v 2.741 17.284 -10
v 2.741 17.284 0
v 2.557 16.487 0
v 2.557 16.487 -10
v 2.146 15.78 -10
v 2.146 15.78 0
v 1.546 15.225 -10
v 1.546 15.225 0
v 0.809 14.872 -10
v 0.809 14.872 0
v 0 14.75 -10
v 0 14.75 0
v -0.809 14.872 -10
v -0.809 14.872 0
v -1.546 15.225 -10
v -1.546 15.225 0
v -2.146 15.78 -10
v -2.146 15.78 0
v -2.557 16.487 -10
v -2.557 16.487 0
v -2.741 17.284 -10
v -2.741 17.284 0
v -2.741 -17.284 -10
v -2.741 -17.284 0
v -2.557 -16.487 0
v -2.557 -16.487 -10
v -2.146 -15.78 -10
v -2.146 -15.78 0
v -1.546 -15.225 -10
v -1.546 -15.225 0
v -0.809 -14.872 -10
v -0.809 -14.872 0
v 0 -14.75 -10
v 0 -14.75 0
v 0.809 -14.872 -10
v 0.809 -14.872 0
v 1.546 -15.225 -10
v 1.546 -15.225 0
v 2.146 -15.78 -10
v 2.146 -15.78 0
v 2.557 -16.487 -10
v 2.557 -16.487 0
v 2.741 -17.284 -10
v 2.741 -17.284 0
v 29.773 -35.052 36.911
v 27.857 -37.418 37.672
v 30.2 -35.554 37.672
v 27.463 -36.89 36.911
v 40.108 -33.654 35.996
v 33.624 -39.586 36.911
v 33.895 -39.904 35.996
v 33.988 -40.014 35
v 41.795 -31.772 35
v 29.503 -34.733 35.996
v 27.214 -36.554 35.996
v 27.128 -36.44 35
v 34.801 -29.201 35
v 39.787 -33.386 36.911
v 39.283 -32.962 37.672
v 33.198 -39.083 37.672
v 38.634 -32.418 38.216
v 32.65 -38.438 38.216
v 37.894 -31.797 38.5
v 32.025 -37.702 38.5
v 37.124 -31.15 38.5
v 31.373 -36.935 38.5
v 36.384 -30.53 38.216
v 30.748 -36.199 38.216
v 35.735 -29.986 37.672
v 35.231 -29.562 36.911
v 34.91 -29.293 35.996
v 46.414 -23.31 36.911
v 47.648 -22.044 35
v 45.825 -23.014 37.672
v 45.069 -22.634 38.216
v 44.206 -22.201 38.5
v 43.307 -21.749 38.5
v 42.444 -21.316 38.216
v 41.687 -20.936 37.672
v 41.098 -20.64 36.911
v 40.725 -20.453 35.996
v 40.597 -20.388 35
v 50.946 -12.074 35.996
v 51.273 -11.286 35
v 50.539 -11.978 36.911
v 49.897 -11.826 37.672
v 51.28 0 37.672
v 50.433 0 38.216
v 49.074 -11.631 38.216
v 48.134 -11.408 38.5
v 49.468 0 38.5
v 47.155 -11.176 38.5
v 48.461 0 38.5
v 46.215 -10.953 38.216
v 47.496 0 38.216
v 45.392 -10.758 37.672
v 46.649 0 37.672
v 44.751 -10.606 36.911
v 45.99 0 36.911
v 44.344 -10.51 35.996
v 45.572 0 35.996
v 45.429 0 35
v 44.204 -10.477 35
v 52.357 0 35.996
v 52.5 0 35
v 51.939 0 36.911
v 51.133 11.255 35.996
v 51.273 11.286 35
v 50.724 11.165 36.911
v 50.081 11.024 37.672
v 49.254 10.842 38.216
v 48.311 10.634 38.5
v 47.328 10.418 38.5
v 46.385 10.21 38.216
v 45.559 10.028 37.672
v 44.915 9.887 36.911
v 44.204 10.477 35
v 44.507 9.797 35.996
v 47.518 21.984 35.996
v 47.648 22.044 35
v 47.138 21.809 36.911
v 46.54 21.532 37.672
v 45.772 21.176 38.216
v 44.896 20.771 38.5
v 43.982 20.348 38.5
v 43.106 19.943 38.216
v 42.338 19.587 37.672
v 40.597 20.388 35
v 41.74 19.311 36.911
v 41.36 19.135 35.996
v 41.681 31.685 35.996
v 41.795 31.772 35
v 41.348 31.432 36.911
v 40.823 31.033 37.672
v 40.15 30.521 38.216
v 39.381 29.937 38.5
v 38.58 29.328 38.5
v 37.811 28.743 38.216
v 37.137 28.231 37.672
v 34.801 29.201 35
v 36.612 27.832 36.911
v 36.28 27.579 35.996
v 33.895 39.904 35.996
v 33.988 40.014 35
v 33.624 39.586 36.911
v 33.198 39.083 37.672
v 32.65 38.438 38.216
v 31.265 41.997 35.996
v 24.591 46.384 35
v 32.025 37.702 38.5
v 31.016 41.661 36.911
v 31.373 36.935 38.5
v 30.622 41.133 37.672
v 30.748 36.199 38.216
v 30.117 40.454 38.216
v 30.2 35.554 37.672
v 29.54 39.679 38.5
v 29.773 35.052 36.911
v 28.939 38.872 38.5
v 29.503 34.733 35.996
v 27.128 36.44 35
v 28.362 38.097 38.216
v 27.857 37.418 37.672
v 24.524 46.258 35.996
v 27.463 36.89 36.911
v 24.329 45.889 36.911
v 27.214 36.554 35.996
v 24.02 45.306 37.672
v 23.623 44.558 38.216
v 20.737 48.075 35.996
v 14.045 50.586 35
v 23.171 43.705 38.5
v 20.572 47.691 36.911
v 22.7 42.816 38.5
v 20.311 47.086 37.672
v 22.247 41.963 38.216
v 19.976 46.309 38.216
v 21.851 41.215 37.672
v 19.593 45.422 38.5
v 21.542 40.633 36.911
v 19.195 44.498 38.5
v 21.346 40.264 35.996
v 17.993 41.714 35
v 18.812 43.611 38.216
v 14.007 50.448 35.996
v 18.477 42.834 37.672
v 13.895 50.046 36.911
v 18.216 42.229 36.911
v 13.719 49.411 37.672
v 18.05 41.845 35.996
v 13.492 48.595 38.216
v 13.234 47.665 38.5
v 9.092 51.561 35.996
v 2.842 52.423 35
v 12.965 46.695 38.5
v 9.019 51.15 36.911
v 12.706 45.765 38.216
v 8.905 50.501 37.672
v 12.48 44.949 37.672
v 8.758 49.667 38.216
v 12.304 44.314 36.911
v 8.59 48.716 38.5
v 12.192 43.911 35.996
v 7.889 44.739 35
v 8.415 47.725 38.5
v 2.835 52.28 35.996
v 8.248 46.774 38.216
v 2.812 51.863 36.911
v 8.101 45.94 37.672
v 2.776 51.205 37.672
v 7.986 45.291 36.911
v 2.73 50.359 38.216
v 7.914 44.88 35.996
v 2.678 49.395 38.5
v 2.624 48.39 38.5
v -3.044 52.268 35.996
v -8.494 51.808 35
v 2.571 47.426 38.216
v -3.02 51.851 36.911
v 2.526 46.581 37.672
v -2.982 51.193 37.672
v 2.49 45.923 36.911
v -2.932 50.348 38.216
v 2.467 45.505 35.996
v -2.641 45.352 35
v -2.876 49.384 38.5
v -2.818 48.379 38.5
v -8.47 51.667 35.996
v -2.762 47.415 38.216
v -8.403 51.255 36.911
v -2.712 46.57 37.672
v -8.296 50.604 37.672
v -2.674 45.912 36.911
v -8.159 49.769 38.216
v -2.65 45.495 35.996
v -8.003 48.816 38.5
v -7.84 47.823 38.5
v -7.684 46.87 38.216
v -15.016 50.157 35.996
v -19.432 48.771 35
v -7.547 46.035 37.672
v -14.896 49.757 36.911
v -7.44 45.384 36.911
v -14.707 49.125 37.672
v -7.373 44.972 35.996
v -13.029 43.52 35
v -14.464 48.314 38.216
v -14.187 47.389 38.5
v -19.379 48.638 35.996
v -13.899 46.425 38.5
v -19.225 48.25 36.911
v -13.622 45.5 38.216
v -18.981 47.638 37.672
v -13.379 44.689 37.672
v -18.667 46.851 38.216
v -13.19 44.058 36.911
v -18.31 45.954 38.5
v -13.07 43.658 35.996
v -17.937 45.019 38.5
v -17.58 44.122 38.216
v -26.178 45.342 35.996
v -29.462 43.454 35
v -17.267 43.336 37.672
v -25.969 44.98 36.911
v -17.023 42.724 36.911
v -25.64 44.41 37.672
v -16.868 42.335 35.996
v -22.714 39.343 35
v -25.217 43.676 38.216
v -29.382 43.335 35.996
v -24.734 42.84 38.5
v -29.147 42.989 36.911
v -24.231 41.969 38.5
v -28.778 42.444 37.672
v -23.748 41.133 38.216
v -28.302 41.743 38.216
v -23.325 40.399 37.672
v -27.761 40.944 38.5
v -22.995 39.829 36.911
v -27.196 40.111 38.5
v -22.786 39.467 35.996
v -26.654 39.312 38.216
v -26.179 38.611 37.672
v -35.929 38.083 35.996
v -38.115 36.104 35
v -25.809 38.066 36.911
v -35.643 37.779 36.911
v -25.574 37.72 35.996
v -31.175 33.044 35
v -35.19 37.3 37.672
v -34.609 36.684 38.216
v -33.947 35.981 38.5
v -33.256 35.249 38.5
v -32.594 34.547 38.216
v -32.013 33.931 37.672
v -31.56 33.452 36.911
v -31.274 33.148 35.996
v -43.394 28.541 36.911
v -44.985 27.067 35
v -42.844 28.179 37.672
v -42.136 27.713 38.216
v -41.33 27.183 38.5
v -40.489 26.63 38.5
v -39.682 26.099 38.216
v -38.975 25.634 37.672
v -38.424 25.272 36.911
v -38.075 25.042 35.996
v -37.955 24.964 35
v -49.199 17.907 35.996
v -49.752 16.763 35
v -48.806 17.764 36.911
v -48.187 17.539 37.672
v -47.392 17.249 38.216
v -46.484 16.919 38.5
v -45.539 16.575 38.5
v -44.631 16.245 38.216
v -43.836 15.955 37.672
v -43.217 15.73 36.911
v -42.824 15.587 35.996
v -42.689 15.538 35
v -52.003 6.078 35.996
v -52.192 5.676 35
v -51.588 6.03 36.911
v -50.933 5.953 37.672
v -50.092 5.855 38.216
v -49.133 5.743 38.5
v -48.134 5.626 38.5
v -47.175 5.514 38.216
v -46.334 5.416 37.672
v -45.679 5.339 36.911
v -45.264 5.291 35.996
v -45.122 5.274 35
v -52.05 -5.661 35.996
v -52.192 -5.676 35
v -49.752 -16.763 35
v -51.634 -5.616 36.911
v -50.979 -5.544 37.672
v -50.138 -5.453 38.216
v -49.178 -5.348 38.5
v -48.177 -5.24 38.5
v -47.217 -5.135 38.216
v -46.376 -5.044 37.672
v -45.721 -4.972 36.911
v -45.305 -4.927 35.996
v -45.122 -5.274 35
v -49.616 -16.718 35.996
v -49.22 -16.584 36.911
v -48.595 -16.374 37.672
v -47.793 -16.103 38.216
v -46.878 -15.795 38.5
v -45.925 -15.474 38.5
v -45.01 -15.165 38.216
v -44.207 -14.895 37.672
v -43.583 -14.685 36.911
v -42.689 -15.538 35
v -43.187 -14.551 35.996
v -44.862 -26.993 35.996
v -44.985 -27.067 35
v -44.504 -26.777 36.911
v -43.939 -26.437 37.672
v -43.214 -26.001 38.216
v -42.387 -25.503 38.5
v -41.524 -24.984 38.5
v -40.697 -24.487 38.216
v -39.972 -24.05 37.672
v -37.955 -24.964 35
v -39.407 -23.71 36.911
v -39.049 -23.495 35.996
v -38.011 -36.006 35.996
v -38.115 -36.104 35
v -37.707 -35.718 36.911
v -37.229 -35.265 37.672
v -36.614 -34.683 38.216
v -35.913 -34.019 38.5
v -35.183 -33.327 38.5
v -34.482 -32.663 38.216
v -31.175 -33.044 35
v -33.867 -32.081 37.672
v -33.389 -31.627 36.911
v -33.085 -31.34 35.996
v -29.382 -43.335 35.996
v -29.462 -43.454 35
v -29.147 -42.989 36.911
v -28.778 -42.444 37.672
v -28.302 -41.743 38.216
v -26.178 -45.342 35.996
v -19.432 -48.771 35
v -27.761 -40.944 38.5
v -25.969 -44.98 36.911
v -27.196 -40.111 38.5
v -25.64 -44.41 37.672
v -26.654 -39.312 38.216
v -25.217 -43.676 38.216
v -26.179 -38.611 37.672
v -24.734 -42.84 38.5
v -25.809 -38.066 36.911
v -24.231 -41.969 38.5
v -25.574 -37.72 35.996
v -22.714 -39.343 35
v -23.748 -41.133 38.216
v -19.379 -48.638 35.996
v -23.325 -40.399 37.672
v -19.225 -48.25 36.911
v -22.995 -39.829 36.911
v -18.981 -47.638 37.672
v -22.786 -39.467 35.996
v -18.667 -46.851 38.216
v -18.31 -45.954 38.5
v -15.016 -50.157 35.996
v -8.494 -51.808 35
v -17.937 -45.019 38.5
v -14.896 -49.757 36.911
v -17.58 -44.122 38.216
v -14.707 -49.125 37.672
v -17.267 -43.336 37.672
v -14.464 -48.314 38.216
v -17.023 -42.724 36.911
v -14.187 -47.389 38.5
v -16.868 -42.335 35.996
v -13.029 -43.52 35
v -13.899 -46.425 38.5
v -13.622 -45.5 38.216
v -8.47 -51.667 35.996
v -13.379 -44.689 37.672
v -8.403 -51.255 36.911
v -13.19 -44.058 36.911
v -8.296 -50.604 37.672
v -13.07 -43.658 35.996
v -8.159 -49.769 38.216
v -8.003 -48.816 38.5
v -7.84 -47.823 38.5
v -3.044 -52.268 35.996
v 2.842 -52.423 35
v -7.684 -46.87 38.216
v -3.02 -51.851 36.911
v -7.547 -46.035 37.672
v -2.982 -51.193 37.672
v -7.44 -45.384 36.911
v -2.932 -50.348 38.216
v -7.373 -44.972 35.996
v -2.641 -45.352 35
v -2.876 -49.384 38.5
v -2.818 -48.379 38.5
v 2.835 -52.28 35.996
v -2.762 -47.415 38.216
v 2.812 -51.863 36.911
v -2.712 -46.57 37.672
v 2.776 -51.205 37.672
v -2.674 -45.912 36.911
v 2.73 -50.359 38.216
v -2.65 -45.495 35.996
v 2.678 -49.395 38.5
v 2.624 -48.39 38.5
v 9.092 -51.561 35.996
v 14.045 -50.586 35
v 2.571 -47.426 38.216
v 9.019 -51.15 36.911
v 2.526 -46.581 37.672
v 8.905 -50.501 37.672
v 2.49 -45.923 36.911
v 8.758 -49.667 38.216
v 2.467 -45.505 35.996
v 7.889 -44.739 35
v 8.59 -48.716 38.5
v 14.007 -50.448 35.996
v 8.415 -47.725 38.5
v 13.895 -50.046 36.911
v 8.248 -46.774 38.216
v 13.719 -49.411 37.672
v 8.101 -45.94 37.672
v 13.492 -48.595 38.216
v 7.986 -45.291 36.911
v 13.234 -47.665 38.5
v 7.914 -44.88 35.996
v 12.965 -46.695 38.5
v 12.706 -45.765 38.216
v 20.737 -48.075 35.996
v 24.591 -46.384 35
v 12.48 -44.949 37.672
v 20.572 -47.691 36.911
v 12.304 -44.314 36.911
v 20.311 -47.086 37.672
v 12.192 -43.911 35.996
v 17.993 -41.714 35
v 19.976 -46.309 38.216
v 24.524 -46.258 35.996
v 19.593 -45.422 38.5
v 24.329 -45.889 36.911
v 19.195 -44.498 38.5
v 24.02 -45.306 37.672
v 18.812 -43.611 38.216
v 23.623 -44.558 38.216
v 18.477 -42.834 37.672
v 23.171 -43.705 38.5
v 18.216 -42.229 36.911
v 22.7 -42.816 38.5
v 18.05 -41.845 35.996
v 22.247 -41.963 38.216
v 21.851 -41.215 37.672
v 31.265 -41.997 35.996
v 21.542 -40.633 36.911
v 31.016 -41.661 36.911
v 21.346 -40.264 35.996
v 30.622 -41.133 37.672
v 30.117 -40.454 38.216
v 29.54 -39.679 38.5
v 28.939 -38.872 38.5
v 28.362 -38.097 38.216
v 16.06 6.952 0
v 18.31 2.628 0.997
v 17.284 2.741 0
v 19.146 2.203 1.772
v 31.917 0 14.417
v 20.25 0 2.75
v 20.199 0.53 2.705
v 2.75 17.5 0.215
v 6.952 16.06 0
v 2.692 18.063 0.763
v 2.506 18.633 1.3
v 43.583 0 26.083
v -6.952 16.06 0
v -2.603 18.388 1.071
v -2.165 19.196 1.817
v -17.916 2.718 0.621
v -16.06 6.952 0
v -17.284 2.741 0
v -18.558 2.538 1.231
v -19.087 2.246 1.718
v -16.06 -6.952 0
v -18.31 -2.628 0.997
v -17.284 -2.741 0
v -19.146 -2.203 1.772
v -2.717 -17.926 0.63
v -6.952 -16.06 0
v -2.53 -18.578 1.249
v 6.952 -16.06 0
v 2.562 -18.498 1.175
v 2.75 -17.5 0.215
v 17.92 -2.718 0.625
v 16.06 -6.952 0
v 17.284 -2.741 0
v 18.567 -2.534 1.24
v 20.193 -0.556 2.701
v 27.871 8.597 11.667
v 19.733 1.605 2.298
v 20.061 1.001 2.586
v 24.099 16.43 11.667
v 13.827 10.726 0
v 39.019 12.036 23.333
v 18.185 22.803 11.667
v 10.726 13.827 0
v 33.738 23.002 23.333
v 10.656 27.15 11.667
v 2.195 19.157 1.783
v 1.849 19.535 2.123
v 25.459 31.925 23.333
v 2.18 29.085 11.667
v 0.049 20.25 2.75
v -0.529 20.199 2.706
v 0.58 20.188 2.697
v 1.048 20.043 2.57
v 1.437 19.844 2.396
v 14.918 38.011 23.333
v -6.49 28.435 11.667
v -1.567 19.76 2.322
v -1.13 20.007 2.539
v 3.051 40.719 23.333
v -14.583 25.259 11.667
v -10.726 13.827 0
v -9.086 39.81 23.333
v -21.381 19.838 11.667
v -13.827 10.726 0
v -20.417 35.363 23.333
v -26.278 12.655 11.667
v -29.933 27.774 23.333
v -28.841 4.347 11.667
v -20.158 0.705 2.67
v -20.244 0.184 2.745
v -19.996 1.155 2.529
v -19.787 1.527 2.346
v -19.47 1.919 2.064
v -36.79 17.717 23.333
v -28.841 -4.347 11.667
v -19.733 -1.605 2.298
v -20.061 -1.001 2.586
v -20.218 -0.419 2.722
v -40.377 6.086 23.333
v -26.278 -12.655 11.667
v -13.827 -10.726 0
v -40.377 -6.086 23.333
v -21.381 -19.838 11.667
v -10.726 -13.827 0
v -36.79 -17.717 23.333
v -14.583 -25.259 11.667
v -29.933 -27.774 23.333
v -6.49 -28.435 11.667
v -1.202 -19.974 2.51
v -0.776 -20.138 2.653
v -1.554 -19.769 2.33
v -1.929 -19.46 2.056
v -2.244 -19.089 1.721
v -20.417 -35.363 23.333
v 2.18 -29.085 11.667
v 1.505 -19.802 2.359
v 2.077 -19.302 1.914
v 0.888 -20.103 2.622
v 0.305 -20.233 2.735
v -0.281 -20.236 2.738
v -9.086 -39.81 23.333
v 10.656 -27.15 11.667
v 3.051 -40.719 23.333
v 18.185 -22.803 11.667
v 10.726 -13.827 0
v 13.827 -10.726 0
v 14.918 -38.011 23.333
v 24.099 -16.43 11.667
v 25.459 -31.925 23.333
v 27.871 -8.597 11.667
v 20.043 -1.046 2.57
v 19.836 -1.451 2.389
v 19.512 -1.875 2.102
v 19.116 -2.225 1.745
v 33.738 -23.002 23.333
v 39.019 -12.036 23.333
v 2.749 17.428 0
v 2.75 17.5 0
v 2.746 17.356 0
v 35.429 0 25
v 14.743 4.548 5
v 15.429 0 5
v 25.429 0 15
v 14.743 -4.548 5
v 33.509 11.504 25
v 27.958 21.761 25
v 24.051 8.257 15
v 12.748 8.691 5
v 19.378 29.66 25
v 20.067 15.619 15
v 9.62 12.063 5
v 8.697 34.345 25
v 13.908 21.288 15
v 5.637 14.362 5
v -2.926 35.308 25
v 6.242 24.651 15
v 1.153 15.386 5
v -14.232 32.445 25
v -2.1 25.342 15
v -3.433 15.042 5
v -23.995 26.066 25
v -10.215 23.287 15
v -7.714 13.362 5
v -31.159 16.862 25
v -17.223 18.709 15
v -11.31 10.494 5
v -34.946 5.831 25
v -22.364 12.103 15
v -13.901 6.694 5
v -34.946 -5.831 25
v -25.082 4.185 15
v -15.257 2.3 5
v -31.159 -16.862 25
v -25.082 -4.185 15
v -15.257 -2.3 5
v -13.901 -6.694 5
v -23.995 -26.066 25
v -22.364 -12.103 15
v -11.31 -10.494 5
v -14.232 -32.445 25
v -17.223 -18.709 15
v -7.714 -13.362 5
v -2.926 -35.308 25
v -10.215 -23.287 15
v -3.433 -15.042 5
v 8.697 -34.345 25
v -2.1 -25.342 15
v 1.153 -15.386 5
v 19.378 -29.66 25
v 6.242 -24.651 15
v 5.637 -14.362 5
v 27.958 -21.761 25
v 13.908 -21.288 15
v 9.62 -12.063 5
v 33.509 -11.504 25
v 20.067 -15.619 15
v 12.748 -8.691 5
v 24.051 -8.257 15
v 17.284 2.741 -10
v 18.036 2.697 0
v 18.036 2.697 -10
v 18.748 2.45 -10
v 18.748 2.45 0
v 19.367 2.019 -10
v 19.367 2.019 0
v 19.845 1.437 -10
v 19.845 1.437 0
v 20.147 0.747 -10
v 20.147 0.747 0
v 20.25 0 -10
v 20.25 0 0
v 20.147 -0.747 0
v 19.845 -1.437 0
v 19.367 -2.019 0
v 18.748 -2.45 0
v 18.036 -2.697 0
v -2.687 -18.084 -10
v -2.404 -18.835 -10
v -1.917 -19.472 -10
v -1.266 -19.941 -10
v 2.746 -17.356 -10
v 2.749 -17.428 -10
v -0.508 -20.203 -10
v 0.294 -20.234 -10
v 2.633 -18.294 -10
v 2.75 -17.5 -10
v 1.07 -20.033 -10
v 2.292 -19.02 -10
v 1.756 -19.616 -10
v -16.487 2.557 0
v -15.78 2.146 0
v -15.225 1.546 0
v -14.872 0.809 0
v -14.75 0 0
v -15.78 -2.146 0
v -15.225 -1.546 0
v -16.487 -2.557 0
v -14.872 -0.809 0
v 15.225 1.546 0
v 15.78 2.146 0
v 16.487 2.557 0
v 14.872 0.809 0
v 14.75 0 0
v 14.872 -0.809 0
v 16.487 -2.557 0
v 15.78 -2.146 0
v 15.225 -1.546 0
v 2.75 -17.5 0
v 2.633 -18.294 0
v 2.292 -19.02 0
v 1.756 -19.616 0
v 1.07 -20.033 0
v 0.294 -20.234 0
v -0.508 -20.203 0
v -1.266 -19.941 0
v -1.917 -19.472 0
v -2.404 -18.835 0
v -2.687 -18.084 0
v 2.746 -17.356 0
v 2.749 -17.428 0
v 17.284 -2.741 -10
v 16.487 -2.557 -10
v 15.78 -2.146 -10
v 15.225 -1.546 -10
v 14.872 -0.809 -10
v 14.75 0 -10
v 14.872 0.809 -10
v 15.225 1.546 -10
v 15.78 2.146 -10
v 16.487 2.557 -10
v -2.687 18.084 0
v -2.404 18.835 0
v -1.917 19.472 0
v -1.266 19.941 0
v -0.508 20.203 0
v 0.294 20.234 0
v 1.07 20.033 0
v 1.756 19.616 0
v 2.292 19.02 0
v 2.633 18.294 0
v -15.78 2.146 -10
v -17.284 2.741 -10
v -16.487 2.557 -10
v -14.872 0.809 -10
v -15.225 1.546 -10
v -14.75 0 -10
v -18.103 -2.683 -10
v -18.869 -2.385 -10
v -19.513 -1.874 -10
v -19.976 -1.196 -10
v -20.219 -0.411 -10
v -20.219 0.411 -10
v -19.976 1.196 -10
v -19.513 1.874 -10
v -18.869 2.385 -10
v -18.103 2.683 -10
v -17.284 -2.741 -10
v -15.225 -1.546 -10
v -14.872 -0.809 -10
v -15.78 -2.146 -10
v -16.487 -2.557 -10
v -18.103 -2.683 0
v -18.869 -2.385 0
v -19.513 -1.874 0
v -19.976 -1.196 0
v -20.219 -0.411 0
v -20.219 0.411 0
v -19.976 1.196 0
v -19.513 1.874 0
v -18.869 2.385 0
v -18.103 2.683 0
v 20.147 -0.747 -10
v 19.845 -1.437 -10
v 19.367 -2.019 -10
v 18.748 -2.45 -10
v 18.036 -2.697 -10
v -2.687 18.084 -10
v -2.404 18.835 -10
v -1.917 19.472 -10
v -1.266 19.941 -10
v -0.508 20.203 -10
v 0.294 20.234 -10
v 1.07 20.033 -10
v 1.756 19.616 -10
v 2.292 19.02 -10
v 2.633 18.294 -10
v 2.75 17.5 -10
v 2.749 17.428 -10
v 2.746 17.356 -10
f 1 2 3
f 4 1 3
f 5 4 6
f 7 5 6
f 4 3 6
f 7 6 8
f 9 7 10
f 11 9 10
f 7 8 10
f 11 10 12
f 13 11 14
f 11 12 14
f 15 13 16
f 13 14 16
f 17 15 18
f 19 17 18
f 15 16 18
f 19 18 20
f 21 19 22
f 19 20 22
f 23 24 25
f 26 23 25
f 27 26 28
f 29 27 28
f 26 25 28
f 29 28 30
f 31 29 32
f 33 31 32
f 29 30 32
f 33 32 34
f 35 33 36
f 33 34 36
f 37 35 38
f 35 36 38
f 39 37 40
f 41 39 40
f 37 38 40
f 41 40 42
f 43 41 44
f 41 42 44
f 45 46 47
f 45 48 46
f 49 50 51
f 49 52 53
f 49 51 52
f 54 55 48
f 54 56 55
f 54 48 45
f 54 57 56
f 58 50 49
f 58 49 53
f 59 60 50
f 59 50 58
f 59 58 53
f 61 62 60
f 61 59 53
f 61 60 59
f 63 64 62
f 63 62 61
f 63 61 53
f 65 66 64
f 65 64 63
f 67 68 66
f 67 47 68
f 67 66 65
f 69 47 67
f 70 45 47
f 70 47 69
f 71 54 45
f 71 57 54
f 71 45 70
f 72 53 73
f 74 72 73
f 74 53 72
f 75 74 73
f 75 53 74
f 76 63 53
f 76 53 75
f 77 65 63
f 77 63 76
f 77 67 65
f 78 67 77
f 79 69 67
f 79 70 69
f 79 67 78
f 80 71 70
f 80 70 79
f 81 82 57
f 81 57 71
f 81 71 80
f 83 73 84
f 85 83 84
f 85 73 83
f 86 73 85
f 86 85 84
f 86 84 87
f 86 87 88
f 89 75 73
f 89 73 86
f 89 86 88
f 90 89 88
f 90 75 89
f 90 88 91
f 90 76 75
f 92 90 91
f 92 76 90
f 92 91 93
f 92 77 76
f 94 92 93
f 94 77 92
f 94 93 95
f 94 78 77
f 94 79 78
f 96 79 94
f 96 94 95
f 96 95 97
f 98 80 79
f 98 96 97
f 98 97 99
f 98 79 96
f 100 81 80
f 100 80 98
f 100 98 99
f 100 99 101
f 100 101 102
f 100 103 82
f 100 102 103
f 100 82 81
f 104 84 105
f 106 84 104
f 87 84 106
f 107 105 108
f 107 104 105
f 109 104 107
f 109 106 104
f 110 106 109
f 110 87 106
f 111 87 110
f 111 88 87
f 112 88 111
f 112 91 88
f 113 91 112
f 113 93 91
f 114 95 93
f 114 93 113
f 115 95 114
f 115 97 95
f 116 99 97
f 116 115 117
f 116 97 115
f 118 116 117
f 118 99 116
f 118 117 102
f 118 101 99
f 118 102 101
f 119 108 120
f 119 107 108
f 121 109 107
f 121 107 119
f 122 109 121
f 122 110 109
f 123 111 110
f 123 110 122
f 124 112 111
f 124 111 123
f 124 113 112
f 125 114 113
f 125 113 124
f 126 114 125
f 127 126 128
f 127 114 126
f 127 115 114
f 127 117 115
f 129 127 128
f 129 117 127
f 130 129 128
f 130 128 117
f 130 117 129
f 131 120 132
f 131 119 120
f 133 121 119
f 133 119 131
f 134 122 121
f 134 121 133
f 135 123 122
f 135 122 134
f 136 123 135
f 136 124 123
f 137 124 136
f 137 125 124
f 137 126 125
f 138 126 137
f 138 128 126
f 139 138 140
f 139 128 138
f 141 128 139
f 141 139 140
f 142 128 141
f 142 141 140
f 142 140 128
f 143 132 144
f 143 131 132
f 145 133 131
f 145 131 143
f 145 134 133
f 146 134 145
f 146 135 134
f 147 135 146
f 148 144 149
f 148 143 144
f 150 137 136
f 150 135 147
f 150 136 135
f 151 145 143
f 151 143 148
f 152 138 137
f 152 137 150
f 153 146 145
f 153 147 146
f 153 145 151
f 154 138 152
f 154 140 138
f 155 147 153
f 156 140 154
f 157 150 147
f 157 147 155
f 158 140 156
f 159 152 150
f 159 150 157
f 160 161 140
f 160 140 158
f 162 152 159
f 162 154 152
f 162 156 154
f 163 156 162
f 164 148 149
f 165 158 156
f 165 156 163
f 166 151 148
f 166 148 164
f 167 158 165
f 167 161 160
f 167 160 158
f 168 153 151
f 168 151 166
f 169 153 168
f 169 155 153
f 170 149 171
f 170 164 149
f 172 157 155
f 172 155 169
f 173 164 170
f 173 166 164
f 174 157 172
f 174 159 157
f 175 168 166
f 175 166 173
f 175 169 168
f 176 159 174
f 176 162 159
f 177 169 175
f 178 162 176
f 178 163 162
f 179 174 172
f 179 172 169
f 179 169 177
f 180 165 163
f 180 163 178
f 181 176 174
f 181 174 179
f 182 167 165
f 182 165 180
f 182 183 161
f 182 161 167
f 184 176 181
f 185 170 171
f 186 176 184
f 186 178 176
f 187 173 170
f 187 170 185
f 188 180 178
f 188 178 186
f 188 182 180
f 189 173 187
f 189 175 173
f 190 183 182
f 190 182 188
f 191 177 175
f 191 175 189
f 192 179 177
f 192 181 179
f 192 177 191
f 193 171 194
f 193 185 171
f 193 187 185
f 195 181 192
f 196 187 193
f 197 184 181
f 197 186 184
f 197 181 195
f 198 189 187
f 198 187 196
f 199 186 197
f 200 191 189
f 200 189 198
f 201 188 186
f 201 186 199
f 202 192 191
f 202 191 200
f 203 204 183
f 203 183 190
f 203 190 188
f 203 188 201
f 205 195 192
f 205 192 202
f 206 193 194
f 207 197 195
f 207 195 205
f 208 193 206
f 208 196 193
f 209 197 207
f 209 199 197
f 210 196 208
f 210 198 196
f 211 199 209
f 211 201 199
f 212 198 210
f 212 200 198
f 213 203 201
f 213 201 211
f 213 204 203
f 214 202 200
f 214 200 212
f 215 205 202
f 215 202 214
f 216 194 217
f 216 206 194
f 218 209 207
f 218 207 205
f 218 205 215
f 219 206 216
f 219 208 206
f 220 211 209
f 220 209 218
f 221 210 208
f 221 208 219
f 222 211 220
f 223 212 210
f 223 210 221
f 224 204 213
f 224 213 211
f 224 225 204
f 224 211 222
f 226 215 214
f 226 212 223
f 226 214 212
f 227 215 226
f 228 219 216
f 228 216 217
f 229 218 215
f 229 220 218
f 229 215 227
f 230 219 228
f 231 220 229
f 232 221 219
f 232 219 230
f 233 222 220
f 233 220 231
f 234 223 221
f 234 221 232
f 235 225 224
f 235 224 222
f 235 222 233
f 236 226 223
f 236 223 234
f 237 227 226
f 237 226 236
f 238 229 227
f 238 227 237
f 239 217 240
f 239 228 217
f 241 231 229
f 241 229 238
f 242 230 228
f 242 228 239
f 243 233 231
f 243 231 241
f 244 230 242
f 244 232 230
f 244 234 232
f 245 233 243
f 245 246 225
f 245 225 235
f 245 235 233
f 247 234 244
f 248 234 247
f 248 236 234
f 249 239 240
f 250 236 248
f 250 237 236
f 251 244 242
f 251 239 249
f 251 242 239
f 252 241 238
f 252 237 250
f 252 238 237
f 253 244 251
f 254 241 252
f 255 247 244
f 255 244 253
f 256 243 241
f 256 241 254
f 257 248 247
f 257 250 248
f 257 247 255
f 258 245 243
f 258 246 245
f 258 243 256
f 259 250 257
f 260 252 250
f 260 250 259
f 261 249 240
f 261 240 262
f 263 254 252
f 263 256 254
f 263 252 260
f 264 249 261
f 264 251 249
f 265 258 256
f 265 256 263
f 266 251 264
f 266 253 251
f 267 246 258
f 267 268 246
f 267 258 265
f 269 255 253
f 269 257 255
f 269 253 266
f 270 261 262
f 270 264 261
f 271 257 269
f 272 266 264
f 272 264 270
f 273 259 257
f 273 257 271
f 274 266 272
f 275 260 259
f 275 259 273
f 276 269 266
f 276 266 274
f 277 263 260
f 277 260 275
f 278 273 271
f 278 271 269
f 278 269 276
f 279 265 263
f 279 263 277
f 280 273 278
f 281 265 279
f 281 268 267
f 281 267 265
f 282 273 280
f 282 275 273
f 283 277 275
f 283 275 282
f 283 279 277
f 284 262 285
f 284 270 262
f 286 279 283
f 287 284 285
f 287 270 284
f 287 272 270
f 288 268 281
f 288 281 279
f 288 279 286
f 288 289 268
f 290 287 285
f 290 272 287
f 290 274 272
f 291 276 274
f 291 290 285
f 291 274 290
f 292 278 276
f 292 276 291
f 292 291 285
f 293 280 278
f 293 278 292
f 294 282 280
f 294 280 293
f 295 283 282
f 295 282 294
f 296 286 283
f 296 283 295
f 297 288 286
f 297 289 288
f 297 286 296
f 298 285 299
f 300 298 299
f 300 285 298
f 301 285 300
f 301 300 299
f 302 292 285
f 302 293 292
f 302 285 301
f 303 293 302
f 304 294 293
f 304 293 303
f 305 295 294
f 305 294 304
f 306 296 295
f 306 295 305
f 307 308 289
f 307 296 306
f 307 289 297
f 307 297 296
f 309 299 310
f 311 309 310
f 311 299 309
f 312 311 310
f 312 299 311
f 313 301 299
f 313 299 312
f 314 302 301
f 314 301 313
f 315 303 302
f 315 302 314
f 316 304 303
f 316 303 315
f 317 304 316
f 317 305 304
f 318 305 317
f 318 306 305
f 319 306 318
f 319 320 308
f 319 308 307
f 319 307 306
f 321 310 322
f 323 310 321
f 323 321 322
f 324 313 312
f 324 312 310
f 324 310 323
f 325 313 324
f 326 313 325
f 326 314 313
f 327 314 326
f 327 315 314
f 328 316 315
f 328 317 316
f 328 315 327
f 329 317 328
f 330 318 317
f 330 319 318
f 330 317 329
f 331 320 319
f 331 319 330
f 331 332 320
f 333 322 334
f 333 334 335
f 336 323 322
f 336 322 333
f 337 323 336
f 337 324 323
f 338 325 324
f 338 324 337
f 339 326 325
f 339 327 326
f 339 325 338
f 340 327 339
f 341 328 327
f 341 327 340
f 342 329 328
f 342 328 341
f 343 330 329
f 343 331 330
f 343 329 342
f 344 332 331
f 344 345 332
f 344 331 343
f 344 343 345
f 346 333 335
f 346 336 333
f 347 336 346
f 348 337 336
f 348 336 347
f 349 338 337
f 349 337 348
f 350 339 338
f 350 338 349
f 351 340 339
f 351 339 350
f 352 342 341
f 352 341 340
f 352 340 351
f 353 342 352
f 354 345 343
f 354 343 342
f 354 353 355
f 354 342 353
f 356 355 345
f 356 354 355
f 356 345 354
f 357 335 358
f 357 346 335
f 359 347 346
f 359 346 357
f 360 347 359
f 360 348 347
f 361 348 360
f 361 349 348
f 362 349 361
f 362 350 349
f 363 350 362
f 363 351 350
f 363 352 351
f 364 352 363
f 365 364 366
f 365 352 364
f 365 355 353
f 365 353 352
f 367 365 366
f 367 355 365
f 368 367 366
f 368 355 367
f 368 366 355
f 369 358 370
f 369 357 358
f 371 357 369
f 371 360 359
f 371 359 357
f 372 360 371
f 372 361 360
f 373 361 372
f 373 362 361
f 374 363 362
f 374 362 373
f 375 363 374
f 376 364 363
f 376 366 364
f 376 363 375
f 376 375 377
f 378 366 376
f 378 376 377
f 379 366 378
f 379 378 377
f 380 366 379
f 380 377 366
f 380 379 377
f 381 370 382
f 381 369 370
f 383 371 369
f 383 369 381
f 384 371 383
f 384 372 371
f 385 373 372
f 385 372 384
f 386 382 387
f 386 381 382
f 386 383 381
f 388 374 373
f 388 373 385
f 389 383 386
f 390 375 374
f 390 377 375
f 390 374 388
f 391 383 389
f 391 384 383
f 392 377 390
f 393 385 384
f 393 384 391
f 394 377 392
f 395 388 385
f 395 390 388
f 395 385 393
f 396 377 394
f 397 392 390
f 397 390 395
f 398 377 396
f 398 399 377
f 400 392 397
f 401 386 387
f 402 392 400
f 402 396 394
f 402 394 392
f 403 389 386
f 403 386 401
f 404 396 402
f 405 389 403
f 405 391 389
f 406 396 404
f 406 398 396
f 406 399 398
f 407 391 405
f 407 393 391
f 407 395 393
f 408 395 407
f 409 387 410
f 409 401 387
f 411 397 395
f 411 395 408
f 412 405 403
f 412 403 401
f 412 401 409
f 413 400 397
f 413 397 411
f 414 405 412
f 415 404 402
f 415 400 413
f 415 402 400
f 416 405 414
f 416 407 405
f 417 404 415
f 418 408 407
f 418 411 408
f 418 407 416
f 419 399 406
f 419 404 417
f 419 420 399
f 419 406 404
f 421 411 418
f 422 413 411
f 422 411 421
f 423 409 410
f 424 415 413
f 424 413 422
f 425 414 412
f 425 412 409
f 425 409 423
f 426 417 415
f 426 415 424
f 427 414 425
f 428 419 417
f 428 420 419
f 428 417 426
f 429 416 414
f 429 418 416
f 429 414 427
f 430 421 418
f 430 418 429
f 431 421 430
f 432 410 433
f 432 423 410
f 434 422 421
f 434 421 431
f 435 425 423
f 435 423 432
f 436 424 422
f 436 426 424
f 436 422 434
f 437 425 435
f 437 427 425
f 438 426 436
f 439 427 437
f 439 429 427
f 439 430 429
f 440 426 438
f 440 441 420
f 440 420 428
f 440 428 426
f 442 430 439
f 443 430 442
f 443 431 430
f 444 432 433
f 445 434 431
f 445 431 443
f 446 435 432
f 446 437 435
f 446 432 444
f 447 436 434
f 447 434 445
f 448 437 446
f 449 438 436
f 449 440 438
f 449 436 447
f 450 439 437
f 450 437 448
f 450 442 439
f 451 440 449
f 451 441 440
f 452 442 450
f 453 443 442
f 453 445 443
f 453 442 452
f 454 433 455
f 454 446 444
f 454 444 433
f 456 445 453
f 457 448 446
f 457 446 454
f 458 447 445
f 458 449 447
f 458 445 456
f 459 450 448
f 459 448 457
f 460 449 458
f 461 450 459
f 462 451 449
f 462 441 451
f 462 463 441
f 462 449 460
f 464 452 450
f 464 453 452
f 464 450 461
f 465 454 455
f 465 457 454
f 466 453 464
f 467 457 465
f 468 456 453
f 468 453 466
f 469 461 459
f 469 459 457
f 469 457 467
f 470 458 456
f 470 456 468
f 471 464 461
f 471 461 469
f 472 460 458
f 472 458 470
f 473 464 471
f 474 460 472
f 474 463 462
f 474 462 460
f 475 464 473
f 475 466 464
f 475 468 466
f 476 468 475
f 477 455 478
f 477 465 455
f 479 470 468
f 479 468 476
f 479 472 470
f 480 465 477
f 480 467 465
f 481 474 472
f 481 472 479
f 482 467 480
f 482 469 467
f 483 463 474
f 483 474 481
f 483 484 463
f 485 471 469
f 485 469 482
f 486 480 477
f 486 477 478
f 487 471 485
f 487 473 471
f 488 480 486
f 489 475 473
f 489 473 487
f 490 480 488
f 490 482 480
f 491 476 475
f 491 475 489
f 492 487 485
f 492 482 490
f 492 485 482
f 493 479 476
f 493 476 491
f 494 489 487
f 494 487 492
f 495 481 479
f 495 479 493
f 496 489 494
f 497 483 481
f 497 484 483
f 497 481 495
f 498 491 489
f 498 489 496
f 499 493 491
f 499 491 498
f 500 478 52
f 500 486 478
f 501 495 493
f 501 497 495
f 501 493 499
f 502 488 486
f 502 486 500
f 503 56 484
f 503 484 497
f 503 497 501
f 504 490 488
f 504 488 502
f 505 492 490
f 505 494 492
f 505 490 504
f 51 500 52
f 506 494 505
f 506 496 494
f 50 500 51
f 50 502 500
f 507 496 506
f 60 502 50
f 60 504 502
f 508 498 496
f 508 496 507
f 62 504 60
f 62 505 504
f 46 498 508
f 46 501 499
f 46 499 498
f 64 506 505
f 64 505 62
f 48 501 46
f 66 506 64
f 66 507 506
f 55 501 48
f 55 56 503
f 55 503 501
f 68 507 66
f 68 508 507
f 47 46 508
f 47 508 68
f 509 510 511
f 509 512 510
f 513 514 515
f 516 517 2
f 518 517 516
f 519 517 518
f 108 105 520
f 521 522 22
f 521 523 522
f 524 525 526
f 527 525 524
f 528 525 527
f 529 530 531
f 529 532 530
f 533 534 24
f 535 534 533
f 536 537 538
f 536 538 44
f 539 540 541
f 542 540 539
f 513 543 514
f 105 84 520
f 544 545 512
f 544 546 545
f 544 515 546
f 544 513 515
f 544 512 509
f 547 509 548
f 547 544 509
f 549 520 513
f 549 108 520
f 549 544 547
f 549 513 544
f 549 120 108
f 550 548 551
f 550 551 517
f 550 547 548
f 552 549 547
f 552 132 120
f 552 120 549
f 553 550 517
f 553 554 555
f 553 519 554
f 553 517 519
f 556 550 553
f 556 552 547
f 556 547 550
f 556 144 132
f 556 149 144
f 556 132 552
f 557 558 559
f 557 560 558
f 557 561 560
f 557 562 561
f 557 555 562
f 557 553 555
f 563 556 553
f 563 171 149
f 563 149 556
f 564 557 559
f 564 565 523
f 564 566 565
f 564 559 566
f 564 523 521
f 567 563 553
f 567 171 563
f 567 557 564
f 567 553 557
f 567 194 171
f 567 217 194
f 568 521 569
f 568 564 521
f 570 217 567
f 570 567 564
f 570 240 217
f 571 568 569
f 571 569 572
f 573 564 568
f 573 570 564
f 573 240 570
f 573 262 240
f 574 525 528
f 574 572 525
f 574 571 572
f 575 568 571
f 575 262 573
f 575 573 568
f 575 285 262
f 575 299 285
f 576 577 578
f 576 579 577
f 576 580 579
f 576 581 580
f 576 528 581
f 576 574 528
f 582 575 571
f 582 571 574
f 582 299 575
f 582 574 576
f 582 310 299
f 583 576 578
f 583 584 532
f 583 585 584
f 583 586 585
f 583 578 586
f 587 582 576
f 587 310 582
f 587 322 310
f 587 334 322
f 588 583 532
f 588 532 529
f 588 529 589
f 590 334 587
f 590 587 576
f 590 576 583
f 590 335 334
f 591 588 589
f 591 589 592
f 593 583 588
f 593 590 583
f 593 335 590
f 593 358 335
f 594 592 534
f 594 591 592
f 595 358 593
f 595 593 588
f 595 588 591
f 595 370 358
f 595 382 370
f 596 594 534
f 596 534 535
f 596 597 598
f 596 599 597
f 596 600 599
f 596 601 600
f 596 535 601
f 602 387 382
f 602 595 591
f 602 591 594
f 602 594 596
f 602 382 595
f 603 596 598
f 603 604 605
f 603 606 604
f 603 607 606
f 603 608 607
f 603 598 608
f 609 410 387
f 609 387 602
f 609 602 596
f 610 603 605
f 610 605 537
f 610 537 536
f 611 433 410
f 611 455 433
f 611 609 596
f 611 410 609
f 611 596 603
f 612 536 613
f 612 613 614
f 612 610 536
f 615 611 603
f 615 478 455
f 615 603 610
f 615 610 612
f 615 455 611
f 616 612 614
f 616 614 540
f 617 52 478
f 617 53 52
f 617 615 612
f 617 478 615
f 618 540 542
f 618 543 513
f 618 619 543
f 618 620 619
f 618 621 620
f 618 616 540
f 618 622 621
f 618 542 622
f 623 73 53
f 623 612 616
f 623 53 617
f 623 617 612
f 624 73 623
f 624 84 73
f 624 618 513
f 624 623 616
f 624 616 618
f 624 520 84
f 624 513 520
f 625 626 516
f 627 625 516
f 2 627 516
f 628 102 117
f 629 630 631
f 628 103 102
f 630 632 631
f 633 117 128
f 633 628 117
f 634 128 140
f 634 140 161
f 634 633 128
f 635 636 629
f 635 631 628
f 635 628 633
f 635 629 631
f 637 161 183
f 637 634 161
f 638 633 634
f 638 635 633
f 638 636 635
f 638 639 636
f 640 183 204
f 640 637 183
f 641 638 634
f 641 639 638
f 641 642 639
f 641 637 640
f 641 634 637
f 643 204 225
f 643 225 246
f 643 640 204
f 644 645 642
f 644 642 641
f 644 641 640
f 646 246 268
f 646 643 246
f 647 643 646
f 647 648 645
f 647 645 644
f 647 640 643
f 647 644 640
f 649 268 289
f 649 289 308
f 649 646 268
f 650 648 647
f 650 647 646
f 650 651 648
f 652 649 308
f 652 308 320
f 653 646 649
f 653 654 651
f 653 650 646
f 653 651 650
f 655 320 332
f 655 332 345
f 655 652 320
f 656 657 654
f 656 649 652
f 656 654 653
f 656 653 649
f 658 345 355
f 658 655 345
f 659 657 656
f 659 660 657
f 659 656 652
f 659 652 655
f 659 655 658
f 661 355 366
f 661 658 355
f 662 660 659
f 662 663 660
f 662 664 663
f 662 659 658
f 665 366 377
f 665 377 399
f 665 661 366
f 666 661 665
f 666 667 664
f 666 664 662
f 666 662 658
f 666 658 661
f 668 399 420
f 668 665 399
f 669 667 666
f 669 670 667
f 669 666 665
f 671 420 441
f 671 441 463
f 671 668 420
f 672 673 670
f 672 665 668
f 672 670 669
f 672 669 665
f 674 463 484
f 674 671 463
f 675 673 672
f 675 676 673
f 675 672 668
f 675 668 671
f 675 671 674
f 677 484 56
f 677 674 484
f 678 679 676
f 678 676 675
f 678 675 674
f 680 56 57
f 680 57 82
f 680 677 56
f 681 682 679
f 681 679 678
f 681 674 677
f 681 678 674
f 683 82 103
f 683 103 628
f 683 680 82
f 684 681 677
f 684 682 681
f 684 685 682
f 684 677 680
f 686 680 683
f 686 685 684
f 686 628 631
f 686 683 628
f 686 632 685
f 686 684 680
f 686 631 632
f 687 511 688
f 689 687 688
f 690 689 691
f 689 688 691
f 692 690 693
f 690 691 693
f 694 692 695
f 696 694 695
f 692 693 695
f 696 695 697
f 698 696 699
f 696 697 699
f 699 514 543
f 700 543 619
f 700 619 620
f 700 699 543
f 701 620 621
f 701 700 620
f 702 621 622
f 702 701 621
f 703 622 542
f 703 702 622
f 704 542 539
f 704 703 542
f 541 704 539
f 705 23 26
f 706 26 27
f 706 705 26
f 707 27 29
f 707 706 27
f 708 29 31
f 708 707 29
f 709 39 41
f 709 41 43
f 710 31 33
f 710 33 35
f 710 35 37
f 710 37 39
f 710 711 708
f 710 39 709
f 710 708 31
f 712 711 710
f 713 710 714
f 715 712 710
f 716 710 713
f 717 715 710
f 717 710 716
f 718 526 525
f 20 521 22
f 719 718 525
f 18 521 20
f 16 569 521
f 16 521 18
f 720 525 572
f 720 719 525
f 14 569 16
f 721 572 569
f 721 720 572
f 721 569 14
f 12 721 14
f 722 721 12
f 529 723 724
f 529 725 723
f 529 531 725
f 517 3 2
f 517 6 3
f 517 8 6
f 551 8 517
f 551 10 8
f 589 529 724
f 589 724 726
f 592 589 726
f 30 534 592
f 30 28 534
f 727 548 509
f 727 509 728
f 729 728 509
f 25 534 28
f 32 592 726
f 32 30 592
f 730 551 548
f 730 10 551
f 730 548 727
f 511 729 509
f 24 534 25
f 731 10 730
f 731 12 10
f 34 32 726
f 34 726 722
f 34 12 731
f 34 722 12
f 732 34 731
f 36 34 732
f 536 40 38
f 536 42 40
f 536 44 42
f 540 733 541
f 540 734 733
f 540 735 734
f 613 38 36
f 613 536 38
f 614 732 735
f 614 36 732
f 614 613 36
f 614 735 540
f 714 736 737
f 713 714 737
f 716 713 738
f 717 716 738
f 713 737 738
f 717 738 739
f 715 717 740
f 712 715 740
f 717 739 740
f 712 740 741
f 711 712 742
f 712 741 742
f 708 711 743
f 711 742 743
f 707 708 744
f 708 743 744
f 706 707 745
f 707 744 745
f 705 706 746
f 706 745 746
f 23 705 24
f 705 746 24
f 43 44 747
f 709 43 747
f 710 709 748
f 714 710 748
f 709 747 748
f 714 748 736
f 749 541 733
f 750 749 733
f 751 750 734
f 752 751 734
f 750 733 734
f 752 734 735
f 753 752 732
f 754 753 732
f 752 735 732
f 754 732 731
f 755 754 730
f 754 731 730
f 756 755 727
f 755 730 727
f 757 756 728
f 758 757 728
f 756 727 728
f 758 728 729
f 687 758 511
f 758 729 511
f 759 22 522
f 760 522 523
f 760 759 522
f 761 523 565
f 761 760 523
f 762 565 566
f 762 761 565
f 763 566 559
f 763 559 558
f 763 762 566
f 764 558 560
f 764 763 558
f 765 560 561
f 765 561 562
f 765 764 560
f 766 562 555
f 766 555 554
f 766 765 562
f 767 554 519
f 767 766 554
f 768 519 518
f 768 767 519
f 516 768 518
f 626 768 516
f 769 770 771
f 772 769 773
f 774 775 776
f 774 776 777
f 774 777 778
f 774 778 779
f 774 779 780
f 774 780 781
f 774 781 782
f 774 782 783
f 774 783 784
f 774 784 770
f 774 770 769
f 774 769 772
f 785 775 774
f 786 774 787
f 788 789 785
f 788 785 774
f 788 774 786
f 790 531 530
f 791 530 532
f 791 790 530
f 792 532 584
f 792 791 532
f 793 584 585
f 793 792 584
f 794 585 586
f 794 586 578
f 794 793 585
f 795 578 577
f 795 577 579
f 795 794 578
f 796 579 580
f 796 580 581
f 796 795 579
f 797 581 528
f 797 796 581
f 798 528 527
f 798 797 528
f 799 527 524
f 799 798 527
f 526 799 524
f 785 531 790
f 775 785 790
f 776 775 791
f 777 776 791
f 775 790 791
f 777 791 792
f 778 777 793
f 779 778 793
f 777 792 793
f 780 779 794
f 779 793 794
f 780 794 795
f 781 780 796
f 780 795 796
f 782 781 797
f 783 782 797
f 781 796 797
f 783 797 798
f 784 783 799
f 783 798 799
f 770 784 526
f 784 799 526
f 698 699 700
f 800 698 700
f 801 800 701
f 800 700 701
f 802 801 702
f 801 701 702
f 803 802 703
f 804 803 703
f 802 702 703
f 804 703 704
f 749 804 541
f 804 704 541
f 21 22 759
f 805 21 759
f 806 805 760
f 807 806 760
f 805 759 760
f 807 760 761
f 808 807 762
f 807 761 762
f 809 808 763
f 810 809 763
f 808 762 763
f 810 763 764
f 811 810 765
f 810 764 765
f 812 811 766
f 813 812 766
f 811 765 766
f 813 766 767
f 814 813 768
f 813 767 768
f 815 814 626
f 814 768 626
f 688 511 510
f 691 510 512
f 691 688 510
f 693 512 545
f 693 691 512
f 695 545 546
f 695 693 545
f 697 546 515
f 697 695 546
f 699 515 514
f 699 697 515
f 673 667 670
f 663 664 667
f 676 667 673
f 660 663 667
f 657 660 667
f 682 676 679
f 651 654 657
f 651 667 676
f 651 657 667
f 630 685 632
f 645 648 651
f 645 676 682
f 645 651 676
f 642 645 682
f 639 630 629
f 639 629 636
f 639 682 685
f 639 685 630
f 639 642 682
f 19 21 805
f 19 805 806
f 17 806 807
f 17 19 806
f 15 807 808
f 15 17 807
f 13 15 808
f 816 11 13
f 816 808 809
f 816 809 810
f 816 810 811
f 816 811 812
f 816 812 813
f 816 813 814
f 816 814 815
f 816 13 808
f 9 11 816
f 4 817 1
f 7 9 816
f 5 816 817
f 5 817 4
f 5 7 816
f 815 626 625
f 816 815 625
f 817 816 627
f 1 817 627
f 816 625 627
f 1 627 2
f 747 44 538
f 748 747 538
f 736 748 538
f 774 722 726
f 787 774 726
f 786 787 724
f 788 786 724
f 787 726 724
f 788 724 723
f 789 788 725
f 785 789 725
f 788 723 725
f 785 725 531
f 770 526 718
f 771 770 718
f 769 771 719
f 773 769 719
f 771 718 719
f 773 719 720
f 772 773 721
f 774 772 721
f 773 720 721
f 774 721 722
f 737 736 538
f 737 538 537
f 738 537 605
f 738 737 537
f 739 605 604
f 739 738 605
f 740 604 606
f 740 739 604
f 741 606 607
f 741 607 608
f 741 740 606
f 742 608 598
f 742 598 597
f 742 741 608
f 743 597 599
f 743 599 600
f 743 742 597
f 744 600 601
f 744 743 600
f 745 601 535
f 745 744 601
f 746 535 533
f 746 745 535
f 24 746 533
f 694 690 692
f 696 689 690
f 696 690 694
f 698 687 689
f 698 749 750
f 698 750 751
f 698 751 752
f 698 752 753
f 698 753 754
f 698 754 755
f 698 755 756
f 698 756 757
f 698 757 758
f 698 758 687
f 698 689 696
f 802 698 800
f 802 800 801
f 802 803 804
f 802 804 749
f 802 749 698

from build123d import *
from build123d import SkipClean  # not in build123d's __all__

# Parameters (mm, degrees)
F4_DEPTH = 10


with BuildPart() as f1:
    # F0 (on Front) → F1 (revolve)
    with BuildSketch(Plane.XZ):
        with BuildLine():
            Line((0, 5), (0, 0))
            Line((0, 0), (17.5, 0))
            Line((17.5, 0), (48.9644660941, 31.4644660941))
            ThreePointArc((48.9644660941, 31.4644660941), (46.4644660941, 32.5), (45.4289321881, 35))
            Line((45.4289321881, 35), (15.4289321881, 5))
            Line((15.4289321881, 5), (0, 5))
        make_face()
        with BuildLine():
            Line((45.4289321881, 35), (52.5, 35))
            ThreePointArc((52.5, 35), (48.9644660941, 38.5355339059), (45.4289321881, 35))
        make_face()
        with BuildLine():
            ThreePointArc((45.4289321881, 35), (46.4644660941, 32.5), (48.9644660941, 31.4644660941))
            Line((48.9644660941, 31.4644660941), (52.5, 35))
            Line((52.5, 35), (45.4289321881, 35))
        make_face()
    revolve(axis=Axis((0, 0, 17.5), (0, 0, 1)))

    # F2 (on face) → F3 (join, up to the next surface of F1)
    with BuildSketch(Plane(origin=(0, 0, 0), x_dir=(1, 0, 0), z_dir=(0, 0, -1))):
        with BuildLine():
            ThreePointArc((17.2839285714, -2.7414983381), (19.3665882743, -2.0194920684), (20.25, 0))
            ThreePointArc((20.25, 0), (19.3665882743, 2.0194920684), (17.2839285714, 2.7414983381))
            ThreePointArc((17.2839285714, 2.7414983381), (17.4458985151, 1.375), (17.5, 0))
            ThreePointArc((17.5, 0), (17.4458985151, -1.375), (17.2839285714, -2.7414983381))
        make_face()
        with BuildLine():
            ThreePointArc((-2.7414983381, 17.2839285714), (0, 17.5), (2.7414983381, 17.2839285714))
            ThreePointArc((2.7414983381, 17.2839285714), (2.7478737625, 17.3918806903), (2.75, 17.5))
            ThreePointArc((2.75, 17.5), (-0.1081193097, 20.2478737625), (-2.7414983381, 17.2839285714))
        make_face()
        with BuildLine():
            ThreePointArc((-2.7414983381, 17.2839285714), (0, 14.75), (2.7414983381, 17.2839285714))
            ThreePointArc((2.7414983381, 17.2839285714), (0, 17.5), (-2.7414983381, 17.2839285714))
        make_face()
        with BuildLine():
            ThreePointArc((2.75, -17.5), (2.7478737625, -17.3918806903), (2.7414983381, -17.2839285714))
            ThreePointArc((2.7414983381, -17.2839285714), (0, -17.5), (-2.7414983381, -17.2839285714))
            ThreePointArc((-2.7414983381, -17.2839285714), (-0.1081193097, -20.2478737625), (2.75, -17.5))
        make_face()
        with BuildLine():
            ThreePointArc((-17.2839285714, -2.7414983381), (-17.5, 0), (-17.2839285714, 2.7414983381))
            ThreePointArc((-17.2839285714, 2.7414983381), (-20.25, 0), (-17.2839285714, -2.7414983381))
        make_face()
    extrude(until=Until.NEXT, dir=(0, 0, 1))

    # F2 (on face) → F4 (join)
    with BuildSketch(Plane(origin=(0, 0, 0), x_dir=(1, 0, 0), z_dir=(0, 0, -1))):
        with BuildLine():
            ThreePointArc((17.2839285714, -2.7414983381), (19.3665882743, -2.0194920684), (20.25, 0))
            ThreePointArc((20.25, 0), (19.3665882743, 2.0194920684), (17.2839285714, 2.7414983381))
            ThreePointArc((17.2839285714, 2.7414983381), (17.4458985151, 1.375), (17.5, 0))
            ThreePointArc((17.5, 0), (17.4458985151, -1.375), (17.2839285714, -2.7414983381))
        make_face()
        with BuildLine():
            ThreePointArc((-2.7414983381, 17.2839285714), (0, 14.75), (2.7414983381, 17.2839285714))
            ThreePointArc((2.7414983381, 17.2839285714), (0, 17.5), (-2.7414983381, 17.2839285714))
        make_face()
        with BuildLine():
            ThreePointArc((-17.2839285714, -2.7414983381), (-17.5, 0), (-17.2839285714, 2.7414983381))
            ThreePointArc((-17.2839285714, 2.7414983381), (-20.25, 0), (-17.2839285714, -2.7414983381))
        make_face()
        with BuildLine():
            ThreePointArc((2.75, -17.5), (2.7478737625, -17.3918806903), (2.7414983381, -17.2839285714))
            ThreePointArc((2.7414983381, -17.2839285714), (0, -17.5), (-2.7414983381, -17.2839285714))
            ThreePointArc((-2.7414983381, -17.2839285714), (-0.1081193097, -20.2478737625), (2.75, -17.5))
        make_face()
        with BuildLine():
            ThreePointArc((-14.75, 0), (-15.4805079316, 1.8665882743), (-17.2839285714, 2.7414983381))
            ThreePointArc((-17.2839285714, 2.7414983381), (-17.5, 0), (-17.2839285714, -2.7414983381))
            ThreePointArc((-17.2839285714, -2.7414983381), (-15.4805079316, -1.8665882743), (-14.75, 0))
        make_face()
        with BuildLine():
            ThreePointArc((-2.7414983381, -17.2839285714), (0, -17.5), (2.7414983381, -17.2839285714))
            ThreePointArc((2.7414983381, -17.2839285714), (0, -14.75), (-2.7414983381, -17.2839285714))
        make_face()
        with BuildLine():
            ThreePointArc((-2.7414983381, 17.2839285714), (0, 17.5), (2.7414983381, 17.2839285714))
            ThreePointArc((2.7414983381, 17.2839285714), (2.7478737625, 17.3918806903), (2.75, 17.5))
            ThreePointArc((2.75, 17.5), (-0.1081193097, 20.2478737625), (-2.7414983381, 17.2839285714))
        make_face()
        with BuildLine():
            ThreePointArc((17.5, 0), (17.4458985151, 1.375), (17.2839285714, 2.7414983381))
            ThreePointArc((17.2839285714, 2.7414983381), (14.75, 0), (17.2839285714, -2.7414983381))
            ThreePointArc((17.2839285714, -2.7414983381), (17.4458985151, -1.375), (17.5, 0))
        make_face()
    with SkipClean():  # cleaning this boolean's faces spoils the solid; the shape is the same uncleaned
        extrude(amount=F4_DEPTH)


solid = f1.part
